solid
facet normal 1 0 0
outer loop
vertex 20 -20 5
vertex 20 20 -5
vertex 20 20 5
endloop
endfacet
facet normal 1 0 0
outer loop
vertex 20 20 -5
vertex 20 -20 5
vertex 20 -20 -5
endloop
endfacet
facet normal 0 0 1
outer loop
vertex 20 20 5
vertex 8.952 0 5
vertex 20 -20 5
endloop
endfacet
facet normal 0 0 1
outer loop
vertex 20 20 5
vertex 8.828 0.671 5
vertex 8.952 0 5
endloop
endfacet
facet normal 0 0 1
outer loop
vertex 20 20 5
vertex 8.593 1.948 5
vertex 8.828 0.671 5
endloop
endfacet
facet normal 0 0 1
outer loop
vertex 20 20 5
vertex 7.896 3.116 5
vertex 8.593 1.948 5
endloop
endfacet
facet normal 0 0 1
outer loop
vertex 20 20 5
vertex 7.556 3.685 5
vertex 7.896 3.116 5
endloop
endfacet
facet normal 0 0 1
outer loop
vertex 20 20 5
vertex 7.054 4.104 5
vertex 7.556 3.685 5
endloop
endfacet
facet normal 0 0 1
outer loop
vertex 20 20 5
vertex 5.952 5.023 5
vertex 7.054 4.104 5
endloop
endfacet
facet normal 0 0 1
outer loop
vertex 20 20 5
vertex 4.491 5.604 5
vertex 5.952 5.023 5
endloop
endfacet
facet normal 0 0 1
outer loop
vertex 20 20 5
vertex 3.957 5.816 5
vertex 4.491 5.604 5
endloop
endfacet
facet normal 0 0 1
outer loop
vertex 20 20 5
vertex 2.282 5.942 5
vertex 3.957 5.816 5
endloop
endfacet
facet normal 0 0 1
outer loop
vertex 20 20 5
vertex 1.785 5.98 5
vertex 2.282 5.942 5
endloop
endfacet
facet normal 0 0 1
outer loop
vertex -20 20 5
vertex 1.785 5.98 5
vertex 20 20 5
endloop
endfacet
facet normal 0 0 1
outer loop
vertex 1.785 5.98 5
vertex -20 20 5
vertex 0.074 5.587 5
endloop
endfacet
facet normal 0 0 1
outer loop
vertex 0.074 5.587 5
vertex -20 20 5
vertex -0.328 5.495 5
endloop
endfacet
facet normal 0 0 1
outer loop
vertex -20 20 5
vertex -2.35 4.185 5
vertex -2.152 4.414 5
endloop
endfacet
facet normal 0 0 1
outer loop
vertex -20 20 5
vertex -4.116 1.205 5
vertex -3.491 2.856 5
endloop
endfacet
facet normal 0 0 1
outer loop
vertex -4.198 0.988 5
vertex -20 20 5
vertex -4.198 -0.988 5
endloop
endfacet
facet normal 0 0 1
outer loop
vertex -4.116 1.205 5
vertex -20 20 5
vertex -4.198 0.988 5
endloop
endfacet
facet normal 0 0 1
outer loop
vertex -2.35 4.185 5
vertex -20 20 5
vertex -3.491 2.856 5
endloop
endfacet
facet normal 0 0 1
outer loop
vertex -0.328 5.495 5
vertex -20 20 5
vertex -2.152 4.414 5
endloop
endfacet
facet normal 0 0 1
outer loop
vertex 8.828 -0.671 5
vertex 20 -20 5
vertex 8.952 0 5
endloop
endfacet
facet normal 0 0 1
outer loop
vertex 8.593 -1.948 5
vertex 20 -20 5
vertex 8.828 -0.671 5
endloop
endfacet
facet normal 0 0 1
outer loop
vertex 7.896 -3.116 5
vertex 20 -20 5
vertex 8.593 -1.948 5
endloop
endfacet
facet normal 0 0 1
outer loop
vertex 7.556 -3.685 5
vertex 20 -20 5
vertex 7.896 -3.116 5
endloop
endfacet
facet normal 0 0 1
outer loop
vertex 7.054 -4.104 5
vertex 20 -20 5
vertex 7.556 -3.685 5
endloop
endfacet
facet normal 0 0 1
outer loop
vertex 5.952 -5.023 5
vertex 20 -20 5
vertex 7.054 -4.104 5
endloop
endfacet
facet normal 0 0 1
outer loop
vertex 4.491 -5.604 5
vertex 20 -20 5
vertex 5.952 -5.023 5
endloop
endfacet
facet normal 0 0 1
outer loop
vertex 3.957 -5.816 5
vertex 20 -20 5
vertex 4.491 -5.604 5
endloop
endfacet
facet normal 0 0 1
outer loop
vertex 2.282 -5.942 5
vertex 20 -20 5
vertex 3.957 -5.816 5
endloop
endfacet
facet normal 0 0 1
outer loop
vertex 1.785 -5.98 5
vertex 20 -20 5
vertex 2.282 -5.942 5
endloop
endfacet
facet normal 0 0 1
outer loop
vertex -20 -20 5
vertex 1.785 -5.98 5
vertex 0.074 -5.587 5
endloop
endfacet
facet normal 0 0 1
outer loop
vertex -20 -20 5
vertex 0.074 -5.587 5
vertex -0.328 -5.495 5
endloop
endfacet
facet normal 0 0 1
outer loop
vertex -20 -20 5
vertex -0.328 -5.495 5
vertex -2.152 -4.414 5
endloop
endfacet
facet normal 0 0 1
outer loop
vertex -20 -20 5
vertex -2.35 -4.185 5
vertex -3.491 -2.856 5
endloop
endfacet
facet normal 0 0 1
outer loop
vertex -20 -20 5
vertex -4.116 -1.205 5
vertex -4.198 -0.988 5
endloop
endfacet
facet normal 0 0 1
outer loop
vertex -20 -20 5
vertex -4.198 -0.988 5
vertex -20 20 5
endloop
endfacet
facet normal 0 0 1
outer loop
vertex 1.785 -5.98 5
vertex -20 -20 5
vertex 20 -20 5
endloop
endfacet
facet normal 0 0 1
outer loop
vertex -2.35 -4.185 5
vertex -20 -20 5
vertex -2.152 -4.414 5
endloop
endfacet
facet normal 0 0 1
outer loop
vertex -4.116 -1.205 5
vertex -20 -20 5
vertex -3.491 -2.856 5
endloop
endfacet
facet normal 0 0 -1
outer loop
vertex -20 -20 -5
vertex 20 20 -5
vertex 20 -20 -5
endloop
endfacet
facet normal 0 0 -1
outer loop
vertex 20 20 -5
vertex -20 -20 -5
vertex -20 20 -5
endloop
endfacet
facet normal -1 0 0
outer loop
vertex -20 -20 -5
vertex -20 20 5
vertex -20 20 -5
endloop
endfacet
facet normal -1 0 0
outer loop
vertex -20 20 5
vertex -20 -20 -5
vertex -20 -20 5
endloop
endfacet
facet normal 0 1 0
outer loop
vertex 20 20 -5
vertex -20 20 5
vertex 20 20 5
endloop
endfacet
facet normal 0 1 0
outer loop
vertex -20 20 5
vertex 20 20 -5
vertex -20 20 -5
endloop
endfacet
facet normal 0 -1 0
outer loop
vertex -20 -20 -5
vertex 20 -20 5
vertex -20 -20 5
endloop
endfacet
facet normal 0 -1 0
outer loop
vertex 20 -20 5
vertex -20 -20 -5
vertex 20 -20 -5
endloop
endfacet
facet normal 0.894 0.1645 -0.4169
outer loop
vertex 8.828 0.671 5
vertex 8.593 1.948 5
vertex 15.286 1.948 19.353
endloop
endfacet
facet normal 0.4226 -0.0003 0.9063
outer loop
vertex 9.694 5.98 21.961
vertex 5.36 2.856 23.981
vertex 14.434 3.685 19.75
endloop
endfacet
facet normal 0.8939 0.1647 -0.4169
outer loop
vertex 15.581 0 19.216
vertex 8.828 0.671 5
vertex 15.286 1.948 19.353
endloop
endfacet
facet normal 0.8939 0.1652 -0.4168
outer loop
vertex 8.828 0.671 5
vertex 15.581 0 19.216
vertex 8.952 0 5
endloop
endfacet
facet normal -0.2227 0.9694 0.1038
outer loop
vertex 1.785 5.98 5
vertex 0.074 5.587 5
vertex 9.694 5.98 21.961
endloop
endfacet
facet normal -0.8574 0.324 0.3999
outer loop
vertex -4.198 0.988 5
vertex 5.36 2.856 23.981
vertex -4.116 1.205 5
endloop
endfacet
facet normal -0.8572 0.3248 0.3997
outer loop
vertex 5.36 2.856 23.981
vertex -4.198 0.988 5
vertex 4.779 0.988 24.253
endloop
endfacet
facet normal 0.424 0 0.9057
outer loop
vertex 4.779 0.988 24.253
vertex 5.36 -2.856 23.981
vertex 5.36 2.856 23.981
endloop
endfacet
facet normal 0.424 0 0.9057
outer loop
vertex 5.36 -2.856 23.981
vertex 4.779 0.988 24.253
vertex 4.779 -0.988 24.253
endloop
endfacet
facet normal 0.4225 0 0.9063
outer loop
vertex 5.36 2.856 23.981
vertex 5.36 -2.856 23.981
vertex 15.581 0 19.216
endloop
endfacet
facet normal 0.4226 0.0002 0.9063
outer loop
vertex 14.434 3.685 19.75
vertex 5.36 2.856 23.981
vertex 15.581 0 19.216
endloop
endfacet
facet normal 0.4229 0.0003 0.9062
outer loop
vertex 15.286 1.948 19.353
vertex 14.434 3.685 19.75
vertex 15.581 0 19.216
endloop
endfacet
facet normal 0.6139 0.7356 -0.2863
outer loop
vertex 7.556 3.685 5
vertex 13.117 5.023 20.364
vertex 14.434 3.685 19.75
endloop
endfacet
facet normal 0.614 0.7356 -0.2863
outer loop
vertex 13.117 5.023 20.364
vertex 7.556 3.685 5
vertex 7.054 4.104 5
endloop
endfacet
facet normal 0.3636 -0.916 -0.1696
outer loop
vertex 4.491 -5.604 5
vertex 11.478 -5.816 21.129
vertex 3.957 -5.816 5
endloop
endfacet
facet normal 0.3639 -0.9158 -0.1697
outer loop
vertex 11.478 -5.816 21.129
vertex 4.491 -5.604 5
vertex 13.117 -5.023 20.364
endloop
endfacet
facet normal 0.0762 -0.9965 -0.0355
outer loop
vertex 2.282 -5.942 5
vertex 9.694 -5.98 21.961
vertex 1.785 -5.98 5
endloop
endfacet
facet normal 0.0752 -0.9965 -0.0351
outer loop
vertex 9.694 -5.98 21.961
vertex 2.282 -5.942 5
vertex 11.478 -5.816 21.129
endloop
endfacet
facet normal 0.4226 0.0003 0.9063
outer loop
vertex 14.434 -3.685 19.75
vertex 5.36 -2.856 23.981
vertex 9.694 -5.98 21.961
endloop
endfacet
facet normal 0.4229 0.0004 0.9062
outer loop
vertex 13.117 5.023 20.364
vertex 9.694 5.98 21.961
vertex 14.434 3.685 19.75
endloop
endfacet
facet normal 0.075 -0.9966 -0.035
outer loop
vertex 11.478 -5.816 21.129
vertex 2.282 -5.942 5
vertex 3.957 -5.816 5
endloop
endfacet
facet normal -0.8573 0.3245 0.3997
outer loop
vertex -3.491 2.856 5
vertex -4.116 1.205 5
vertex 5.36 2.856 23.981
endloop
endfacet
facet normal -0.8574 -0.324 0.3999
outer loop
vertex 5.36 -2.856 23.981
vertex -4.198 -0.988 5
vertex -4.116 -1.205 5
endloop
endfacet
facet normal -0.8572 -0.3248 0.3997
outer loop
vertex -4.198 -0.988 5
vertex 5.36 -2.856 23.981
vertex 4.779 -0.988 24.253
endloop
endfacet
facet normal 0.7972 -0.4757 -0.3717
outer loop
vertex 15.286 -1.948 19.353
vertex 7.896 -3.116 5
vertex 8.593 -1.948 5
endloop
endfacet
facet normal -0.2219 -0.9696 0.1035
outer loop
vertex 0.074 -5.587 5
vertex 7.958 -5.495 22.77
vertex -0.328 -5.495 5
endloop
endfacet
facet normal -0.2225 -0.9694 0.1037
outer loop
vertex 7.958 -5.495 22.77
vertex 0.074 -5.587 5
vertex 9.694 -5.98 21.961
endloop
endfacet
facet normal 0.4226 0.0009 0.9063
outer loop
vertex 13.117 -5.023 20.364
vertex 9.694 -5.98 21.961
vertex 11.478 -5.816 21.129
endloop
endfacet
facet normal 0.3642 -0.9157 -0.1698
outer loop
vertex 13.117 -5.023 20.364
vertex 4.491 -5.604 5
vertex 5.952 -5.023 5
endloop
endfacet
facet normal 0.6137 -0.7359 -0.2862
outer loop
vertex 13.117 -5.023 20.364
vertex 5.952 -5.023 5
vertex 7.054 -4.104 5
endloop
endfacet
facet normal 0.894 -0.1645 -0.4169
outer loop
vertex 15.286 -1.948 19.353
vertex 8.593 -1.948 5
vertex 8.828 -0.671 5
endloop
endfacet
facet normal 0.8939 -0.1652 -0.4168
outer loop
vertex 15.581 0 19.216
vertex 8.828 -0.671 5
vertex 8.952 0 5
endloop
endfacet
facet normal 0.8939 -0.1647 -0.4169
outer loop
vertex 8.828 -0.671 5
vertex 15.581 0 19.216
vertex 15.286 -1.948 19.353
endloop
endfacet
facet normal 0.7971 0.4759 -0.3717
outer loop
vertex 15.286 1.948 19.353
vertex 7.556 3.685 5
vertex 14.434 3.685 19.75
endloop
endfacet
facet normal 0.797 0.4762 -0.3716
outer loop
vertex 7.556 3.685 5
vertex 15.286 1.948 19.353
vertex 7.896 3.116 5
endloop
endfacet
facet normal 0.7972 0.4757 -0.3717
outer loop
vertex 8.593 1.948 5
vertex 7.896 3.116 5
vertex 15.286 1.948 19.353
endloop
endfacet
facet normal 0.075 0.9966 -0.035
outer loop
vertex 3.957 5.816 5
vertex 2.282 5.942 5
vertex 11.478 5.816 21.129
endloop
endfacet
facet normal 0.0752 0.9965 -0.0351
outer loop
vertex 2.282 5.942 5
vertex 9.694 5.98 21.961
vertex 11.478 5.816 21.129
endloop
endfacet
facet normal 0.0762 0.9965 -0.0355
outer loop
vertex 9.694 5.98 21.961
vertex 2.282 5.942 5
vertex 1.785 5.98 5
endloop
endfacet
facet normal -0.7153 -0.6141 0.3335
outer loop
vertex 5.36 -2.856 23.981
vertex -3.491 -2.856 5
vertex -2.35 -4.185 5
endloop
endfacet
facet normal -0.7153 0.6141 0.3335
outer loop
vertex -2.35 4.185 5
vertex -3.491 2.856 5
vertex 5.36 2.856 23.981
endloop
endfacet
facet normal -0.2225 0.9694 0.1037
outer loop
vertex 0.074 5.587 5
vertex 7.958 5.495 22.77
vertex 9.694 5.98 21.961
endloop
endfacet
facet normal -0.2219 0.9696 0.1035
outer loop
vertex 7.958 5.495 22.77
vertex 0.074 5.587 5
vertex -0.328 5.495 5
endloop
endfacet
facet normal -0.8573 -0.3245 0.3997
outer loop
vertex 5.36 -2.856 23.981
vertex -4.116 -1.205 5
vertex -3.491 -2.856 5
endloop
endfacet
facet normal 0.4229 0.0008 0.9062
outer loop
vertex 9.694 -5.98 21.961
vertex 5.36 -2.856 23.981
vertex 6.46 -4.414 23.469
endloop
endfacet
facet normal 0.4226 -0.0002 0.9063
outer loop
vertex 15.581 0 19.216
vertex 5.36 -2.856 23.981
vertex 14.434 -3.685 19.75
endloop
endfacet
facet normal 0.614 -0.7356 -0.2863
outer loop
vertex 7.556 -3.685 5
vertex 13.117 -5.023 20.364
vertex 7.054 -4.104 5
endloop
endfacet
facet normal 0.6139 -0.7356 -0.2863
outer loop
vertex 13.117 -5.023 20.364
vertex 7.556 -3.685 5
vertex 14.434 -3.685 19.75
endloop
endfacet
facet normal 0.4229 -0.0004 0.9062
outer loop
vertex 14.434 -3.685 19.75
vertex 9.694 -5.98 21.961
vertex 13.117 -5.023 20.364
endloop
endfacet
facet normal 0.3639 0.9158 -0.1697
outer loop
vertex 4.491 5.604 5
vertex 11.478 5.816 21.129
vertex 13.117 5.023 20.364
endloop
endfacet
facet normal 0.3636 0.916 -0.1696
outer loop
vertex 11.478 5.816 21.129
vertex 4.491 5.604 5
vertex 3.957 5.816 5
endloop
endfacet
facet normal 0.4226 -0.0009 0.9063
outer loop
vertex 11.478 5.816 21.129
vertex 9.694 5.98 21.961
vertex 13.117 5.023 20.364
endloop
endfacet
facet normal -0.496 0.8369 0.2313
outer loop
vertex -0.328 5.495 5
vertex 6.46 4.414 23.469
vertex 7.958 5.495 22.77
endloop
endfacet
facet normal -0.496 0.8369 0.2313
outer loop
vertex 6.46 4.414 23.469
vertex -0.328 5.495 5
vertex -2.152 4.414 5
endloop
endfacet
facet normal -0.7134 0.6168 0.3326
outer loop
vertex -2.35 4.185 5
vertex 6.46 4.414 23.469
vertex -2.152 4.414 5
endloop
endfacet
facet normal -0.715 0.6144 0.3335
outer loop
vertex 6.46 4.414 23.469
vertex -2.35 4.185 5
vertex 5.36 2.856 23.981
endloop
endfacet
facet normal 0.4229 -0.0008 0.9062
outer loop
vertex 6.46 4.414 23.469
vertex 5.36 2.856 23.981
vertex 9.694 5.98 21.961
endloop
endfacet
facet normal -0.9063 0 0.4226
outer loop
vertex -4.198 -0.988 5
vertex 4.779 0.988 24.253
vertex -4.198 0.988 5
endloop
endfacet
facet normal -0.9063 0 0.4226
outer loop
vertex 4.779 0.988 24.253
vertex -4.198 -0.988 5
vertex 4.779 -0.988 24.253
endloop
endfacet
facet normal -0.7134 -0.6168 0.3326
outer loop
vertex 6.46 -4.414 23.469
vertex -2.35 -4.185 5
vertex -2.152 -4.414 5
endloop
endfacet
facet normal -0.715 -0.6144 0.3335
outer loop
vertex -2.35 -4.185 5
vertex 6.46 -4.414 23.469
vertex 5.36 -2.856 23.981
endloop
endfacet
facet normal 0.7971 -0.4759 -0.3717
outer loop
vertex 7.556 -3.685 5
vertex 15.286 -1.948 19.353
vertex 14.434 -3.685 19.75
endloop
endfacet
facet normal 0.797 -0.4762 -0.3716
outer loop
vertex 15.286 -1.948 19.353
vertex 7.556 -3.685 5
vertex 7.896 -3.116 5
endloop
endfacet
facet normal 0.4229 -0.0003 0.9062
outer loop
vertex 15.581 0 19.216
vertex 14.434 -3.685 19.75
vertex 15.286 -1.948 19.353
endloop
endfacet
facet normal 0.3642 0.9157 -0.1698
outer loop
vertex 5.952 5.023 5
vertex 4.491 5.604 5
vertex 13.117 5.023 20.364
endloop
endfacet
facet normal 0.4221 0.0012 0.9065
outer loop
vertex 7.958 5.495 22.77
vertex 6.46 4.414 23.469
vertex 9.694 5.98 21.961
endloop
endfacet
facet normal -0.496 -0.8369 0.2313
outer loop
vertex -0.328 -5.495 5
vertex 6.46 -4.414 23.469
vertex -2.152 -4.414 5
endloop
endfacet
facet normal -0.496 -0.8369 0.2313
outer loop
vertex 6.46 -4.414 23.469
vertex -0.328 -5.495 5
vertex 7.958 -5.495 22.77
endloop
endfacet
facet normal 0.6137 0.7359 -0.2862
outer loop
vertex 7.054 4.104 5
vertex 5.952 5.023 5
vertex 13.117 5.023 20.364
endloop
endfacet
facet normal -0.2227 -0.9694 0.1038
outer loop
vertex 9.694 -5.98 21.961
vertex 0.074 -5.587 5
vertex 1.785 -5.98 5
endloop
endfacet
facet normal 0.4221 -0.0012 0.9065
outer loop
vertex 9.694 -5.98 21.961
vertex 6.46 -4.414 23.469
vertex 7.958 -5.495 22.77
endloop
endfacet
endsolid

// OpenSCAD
// A cylinder plunging obliquely into a flat face -- D23's second family, where
// whole creases were discarded on misses that are not real.
FNSET = 0; $fn = FNSET;
R = 1;
union() {
    cube([40, 40, 10], center = true);
    rotate([0, 25, 0]) cylinder(d = 12, h = 24);
}
